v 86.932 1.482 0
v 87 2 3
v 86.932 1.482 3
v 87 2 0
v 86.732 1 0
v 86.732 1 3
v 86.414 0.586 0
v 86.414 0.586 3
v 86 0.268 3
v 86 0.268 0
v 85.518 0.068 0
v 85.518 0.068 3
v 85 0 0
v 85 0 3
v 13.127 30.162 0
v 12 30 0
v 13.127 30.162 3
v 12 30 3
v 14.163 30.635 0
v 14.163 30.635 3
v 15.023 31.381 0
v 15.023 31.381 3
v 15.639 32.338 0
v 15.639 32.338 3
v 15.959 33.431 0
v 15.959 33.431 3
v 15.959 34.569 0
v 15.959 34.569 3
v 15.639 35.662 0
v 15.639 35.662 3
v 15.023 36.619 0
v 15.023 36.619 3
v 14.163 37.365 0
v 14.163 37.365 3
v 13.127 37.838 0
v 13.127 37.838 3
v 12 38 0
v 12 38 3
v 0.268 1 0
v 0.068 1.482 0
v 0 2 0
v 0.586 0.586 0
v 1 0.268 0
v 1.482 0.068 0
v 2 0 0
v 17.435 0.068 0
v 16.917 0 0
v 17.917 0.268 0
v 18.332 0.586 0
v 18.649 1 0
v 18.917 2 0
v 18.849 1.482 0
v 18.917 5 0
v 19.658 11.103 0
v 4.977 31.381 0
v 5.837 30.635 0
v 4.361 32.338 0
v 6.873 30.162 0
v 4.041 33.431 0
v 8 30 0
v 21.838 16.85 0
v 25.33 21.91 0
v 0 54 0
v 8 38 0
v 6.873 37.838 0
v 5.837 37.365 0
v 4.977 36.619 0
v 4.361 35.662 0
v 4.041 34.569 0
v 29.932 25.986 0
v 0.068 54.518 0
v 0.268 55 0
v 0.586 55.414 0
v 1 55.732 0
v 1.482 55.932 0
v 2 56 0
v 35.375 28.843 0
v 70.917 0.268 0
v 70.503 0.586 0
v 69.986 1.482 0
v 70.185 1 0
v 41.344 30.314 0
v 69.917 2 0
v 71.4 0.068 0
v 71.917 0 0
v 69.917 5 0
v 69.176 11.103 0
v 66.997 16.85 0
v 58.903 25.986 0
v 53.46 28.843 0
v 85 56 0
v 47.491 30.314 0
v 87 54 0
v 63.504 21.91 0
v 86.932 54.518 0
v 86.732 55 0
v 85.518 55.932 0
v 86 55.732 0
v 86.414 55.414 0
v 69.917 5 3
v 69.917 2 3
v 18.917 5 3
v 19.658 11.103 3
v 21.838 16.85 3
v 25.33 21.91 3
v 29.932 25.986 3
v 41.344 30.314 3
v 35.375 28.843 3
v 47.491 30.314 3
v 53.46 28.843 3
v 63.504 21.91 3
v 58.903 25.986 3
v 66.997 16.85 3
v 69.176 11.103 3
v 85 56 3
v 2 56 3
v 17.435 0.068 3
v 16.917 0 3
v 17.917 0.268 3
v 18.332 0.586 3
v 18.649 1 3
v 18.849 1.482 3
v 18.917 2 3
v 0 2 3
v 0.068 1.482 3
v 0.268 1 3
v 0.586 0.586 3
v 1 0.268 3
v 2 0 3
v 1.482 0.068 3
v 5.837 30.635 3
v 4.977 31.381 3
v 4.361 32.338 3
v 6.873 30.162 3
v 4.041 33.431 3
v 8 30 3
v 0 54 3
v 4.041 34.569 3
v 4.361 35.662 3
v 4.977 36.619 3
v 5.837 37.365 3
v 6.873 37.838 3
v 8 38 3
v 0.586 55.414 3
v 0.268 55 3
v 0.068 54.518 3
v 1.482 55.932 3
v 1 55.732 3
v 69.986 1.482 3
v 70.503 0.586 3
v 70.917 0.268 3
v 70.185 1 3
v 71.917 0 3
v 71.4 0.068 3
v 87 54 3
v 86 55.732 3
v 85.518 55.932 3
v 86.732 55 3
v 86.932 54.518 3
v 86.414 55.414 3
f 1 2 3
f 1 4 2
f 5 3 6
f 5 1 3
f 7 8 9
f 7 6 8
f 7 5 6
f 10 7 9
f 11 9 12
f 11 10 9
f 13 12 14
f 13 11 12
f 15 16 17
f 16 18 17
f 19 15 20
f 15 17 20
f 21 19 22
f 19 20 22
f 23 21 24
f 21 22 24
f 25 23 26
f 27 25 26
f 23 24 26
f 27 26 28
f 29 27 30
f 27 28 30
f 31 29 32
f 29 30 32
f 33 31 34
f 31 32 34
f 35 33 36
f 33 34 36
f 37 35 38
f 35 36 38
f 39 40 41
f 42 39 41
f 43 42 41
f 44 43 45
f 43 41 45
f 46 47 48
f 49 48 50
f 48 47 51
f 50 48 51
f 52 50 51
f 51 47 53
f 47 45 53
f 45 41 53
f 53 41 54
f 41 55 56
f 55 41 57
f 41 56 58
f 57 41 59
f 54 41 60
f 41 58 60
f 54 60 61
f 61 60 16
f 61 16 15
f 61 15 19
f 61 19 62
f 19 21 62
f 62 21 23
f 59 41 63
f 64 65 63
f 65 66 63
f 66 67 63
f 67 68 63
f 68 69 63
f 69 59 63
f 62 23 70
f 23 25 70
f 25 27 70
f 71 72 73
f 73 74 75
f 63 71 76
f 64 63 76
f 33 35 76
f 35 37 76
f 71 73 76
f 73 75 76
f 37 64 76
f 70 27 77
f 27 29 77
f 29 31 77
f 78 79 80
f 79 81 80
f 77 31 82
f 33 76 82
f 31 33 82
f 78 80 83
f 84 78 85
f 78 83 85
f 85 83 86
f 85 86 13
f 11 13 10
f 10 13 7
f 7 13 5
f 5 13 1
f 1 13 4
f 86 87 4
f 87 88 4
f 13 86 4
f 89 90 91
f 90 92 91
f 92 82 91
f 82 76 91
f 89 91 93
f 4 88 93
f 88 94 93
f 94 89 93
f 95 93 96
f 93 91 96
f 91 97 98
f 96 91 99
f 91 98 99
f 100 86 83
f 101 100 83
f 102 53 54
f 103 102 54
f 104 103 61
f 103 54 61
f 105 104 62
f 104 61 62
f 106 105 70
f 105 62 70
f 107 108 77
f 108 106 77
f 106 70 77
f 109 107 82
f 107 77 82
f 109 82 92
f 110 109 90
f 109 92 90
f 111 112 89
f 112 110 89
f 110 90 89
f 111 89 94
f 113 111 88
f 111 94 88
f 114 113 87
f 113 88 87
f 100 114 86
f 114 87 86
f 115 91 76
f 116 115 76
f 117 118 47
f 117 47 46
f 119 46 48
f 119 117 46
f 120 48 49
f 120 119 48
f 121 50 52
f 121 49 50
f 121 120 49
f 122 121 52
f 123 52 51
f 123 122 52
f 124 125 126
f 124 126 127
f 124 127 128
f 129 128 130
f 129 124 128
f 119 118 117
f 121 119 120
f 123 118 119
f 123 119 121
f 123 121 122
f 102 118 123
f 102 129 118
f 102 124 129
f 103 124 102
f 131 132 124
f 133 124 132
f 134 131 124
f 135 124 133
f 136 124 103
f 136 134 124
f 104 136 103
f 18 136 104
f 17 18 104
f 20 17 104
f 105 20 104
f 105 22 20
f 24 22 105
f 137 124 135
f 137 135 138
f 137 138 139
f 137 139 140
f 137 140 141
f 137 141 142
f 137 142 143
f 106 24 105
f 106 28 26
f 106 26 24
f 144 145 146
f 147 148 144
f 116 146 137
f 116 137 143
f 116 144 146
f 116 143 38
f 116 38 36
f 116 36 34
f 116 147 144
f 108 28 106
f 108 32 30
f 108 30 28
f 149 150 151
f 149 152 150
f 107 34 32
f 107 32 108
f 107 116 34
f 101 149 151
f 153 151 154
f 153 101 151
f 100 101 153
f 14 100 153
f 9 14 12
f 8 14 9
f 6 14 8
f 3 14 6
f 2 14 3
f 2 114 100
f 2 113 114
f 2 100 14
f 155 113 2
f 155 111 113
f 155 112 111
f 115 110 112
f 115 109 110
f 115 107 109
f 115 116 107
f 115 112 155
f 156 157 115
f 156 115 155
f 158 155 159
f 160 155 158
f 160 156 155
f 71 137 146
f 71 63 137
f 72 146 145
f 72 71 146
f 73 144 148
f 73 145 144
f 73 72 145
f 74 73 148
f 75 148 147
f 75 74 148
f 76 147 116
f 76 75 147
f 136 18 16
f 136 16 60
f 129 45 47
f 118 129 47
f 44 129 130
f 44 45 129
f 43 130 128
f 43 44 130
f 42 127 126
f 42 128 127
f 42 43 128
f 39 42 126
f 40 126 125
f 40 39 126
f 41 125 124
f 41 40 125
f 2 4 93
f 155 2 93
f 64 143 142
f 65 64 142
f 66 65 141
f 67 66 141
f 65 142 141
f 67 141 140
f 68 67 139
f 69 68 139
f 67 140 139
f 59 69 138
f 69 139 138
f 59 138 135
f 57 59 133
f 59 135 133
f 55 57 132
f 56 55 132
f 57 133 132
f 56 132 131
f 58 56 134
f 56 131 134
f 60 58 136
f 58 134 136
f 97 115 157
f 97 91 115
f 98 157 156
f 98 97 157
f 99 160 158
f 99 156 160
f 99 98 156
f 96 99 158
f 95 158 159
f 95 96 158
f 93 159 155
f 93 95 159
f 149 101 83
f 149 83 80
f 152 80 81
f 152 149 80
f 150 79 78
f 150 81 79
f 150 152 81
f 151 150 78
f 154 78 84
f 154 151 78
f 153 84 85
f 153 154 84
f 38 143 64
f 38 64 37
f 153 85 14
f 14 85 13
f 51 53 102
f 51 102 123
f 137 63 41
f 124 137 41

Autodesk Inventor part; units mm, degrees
ref_plane "YZ Plane" through (0, 0, 0) normal (1, 0, 0) x (0, 1, 0)
ref_plane "XZ Plane" through (0, 0, 0) normal (0, 1, 0) x (-1, 0, 0)
ref_plane "XY Plane" through (0, 0, 0) normal (0, 0, 1) x (1, 0, 0)
sketch "Sketch1" plane through (0, 0, 0) normal (0, 0, 1) x (1, 0, 0)
  line L0 (2, 0) -> (20.9174, 0)
  line L1 (87, 2) -> (87, 54)
  line L2 (85, 56) -> (2, 56)
  line L3 (0, 54) -> (0, 2)
  line L4 (44.4174, 5) -> (44.4174, 0)
  arc A0 (2, 56) -> (0, 54) centre (2, 54) ccw
  arc A1 (87, 54) -> (85, 56) centre (85, 54) ccw
  arc A2 (85, 0) -> (87, 2) centre (85, 2) ccw
  arc A3 (0, 2) -> (2, 0) centre (2, 2) ccw
  line L5 (69.9174, 0) -> (85, 0)
  line L6 (20.9174, 0) -> (20.9174, 5)
  circle A4 centre (44.4174, 5) radius 23.5
  line L7 (67.9174, 0) -> (67.9174, 5)
  line L8 (67.9174, 0) -> (69.9174, 0)
  circle A5 centre (44.4174, 5) radius 25.5
  line L9 (18.9174, 5) -> (18.9174, 0)
  line L10 (69.9174, 5) -> (69.9174, 0)
  point P0 (0, 0)
  point P1 (87, 56)
  point P2 (87, 0)
  point P3 (0, 56)
  dimension "d0" = 87
  dimension "d1" = 56
  dimension "d2" = 5
  dimension "d7" = 2
  dimension "d10" = 20.9174
  dimension "d11" = 47
  dimension "d12" = 2
extrude "Extrusion1" add sketch "Sketch1" along normal blind 3 contours A3 L3 A0 L2 A1 L1 A2 L5 L10 A5 L9 L0
fillet "Fillet1" radius 2 2 edges at (18.9174, 0, 1.5) (69.9174, 0, 1.5)
sketch "Sketch2" plane through (0, 0, 3) normal (0, 0, 1) x (1, 0, 0)
  line L0 (4, 38) -> (16, 38)
  line L1 (16, 38) -> (16, 30)
  line L2 (16, 30) -> (4, 30)
  line L3 (4, 30) -> (4, 38)
  line L4 (2, 0) -> (16.9174, 0) projected
  line L5 (0, 54) -> (0, 2) projected
  circle A0 centre (8, 34) radius 4
  circle A1 centre (12, 34) radius 4
  point P0 (0, 0)
  point P1 (12, 38)
  point P2 (8, 38)
  point P3 (8, 30)
  point P4 (12, 30)
  dimension "d14" = 30
  dimension "d15" = 8
  dimension "d16" = 4
  dimension "d17" = 12
extrude "Extrusion2" cut sketch "Sketch2" against normal blind 3 contours L0 A1 A0 | A0 A1 | A1 A0 | A0 A1 | A0 A1 L2
properties part number "PAREDES LATERALES"
